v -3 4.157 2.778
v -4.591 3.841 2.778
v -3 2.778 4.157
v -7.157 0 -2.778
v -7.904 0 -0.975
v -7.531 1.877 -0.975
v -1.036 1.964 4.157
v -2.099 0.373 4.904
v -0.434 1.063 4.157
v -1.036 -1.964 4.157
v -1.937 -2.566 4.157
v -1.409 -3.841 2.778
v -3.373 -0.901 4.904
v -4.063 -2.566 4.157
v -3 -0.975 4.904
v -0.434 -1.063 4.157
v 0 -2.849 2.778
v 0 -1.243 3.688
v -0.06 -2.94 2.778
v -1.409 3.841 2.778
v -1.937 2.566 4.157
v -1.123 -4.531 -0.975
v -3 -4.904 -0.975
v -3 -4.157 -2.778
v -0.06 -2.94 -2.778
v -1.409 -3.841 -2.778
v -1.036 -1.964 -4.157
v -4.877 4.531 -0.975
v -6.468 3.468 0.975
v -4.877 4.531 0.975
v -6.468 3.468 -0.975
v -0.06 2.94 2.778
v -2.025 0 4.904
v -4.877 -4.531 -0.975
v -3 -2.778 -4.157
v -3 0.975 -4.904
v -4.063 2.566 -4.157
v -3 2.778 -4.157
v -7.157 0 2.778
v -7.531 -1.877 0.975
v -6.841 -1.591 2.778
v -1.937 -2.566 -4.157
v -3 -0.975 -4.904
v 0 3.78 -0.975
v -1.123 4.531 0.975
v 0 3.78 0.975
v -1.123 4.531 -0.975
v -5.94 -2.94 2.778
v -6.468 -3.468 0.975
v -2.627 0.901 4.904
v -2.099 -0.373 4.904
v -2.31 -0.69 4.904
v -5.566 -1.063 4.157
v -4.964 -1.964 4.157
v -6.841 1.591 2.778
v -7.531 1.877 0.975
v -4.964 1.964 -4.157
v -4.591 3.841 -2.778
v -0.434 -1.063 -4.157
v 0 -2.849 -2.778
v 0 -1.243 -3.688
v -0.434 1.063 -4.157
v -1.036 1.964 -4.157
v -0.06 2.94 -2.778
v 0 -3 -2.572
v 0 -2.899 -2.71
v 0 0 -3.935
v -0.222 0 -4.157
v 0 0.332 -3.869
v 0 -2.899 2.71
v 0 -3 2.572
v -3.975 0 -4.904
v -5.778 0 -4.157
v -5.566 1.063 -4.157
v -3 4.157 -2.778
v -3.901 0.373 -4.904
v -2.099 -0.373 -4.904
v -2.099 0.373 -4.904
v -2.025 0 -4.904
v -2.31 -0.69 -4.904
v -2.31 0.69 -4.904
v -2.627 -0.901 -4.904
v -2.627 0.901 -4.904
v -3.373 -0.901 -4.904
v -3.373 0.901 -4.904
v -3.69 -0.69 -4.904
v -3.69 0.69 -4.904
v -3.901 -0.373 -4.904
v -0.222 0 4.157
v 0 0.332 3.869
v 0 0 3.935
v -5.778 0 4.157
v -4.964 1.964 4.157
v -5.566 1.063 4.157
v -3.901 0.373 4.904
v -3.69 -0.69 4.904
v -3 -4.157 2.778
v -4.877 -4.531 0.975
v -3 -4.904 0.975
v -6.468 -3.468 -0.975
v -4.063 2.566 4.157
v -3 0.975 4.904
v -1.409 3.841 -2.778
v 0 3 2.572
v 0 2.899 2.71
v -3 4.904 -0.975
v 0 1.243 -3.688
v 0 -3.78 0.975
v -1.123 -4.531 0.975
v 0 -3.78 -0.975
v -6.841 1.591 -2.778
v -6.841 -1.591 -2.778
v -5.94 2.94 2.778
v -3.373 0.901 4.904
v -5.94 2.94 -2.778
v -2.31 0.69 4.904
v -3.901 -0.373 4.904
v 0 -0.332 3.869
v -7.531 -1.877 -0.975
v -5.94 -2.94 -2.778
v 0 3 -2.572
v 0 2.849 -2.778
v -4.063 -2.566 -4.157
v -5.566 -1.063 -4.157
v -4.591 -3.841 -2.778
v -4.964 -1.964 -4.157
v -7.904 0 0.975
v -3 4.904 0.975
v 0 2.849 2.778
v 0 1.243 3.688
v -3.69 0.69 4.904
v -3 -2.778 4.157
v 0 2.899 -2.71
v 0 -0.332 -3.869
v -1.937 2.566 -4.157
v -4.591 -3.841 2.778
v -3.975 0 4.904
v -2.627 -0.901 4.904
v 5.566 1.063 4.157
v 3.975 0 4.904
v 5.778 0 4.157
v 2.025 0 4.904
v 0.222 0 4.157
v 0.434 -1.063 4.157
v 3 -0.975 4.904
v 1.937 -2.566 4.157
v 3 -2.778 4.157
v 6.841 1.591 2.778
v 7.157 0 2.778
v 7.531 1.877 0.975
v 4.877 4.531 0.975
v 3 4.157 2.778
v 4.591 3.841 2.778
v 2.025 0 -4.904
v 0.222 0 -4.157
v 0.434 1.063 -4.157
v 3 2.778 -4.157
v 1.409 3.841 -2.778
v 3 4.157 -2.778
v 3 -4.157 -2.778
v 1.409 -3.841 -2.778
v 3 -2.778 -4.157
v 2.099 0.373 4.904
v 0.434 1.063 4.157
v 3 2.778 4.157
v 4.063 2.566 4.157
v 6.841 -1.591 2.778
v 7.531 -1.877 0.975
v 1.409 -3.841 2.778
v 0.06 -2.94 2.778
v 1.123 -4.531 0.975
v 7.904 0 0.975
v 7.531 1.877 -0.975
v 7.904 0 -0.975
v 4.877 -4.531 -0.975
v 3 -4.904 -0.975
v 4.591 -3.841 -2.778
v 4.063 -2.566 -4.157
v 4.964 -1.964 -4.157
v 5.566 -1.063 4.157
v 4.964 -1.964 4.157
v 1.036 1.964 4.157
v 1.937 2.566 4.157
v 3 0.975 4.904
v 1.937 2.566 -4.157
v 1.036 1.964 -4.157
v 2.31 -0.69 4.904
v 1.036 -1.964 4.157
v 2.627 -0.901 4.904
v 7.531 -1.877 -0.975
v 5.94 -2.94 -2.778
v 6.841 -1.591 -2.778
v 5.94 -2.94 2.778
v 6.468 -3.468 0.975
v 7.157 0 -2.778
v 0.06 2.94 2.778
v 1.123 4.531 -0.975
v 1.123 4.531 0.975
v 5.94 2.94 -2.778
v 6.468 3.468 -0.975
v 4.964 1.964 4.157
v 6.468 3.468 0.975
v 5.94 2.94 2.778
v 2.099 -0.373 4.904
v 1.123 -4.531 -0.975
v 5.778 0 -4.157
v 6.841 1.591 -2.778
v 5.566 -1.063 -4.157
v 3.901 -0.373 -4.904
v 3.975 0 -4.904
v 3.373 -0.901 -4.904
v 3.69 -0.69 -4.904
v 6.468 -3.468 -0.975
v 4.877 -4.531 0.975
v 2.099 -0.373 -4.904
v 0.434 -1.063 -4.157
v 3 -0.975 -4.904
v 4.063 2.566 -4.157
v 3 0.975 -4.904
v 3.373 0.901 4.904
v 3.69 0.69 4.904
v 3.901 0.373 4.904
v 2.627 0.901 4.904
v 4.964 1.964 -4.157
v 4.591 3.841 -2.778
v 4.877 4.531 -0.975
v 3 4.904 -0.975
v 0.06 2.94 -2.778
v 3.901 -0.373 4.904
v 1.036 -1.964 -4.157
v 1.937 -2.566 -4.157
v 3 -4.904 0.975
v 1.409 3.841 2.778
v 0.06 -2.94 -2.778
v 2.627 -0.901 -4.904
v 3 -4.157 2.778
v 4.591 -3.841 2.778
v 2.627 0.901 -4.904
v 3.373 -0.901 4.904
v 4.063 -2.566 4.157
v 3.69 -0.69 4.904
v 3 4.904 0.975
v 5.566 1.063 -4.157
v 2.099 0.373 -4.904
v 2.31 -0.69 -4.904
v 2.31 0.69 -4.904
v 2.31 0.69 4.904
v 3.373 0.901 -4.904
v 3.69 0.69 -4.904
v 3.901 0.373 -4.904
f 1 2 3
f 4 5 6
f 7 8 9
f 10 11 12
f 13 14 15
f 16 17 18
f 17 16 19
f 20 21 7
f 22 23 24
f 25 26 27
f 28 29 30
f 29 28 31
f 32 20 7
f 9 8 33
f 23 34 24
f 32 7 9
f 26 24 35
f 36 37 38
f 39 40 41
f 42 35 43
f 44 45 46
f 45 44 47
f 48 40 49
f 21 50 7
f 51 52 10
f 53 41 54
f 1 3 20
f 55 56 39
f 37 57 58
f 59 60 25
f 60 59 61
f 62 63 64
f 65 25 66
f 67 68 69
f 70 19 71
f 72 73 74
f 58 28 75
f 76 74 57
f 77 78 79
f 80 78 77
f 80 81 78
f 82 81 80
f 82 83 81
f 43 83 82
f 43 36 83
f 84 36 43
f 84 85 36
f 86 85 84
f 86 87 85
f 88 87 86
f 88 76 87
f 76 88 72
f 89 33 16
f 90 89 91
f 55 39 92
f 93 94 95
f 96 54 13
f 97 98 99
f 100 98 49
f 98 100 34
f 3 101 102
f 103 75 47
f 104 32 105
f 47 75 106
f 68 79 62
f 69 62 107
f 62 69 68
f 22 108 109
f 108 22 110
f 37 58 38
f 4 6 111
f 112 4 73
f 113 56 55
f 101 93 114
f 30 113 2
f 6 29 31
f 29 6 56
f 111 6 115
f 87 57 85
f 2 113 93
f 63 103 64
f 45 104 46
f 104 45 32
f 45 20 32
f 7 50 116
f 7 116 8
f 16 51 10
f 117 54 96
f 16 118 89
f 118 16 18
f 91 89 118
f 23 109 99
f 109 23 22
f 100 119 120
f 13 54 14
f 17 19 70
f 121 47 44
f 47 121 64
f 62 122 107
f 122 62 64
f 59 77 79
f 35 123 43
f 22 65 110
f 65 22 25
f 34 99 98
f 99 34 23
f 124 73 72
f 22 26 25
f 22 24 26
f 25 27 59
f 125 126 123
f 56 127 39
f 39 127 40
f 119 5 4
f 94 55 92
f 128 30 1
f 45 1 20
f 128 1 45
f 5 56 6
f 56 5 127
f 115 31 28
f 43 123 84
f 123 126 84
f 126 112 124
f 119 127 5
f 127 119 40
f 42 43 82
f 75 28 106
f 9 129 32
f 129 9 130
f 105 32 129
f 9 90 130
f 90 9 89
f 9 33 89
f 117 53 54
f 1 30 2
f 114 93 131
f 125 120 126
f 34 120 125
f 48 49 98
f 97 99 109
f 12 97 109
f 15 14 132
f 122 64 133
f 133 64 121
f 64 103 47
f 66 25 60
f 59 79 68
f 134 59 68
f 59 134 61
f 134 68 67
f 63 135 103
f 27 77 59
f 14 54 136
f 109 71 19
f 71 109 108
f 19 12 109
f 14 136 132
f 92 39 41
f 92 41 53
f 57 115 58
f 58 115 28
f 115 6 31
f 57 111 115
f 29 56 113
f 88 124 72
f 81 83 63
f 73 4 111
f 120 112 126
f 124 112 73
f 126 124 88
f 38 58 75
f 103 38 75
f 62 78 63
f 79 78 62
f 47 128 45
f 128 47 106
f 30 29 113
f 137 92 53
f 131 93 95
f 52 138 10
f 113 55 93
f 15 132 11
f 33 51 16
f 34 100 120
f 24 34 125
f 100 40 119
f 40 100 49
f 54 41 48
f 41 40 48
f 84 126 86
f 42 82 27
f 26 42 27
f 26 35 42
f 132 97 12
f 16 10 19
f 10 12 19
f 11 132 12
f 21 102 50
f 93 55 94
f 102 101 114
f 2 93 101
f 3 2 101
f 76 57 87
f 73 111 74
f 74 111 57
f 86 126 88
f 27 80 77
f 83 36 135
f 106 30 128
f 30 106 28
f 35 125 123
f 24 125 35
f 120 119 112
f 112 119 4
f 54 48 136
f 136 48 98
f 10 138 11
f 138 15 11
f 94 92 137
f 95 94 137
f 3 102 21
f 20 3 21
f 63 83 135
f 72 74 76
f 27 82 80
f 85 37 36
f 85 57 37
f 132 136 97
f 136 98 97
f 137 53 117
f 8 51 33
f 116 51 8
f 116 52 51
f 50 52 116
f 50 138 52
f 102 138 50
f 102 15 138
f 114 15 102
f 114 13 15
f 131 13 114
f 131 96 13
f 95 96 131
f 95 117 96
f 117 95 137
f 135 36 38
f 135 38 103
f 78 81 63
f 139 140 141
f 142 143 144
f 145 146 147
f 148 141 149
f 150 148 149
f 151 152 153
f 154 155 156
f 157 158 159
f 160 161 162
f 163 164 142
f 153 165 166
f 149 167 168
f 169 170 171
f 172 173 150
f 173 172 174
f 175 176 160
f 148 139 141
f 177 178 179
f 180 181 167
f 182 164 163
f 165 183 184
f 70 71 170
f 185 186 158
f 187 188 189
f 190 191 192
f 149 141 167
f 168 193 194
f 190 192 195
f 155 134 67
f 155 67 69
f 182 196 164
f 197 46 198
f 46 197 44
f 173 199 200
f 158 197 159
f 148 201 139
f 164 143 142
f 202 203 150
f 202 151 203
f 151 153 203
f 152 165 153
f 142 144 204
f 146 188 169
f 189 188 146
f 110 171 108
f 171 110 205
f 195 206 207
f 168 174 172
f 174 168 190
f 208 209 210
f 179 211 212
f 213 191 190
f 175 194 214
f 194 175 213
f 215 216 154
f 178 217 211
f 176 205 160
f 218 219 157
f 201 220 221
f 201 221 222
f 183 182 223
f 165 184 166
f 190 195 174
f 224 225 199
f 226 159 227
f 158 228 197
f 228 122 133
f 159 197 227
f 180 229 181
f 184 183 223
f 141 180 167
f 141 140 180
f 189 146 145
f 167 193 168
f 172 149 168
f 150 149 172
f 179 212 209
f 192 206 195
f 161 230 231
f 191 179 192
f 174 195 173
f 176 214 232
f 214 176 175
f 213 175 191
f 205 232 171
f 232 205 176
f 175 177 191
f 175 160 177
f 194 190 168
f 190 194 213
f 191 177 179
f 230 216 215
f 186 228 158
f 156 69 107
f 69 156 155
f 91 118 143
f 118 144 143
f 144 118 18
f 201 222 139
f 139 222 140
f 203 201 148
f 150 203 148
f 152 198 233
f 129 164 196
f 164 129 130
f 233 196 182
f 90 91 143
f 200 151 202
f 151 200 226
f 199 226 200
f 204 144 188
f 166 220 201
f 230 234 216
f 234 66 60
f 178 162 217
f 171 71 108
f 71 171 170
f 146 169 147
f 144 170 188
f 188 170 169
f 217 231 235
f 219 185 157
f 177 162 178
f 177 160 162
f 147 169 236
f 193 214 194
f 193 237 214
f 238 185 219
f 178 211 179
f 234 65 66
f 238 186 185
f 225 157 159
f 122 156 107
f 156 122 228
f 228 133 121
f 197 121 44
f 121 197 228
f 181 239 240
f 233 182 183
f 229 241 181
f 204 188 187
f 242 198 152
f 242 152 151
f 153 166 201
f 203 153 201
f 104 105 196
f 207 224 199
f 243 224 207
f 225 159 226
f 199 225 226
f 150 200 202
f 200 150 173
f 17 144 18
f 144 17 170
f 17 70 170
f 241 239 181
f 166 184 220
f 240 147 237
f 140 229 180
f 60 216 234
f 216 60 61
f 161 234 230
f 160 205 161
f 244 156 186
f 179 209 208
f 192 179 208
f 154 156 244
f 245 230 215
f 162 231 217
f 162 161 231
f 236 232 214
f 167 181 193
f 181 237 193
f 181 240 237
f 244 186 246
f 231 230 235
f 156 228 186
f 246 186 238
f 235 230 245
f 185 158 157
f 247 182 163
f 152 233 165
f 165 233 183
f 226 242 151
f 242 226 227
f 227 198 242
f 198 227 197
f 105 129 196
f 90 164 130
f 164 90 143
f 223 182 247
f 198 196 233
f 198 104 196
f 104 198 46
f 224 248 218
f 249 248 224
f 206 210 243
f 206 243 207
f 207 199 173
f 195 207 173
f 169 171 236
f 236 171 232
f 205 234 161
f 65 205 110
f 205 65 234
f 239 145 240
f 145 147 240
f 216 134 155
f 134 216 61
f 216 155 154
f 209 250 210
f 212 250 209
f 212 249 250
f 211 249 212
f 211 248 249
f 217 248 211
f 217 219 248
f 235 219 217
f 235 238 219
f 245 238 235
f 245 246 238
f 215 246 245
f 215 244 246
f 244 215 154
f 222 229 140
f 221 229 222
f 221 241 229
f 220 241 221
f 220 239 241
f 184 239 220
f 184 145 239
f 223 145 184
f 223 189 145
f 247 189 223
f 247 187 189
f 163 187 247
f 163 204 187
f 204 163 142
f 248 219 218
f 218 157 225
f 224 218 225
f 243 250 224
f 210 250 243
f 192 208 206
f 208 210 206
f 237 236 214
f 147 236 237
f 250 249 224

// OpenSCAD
// Two spheres overlapping — tests span merging for union
union() {
    translate([-3, 0, 0]) sphere(r=5);
    translate([ 3, 0, 0]) sphere(r=5);
}
